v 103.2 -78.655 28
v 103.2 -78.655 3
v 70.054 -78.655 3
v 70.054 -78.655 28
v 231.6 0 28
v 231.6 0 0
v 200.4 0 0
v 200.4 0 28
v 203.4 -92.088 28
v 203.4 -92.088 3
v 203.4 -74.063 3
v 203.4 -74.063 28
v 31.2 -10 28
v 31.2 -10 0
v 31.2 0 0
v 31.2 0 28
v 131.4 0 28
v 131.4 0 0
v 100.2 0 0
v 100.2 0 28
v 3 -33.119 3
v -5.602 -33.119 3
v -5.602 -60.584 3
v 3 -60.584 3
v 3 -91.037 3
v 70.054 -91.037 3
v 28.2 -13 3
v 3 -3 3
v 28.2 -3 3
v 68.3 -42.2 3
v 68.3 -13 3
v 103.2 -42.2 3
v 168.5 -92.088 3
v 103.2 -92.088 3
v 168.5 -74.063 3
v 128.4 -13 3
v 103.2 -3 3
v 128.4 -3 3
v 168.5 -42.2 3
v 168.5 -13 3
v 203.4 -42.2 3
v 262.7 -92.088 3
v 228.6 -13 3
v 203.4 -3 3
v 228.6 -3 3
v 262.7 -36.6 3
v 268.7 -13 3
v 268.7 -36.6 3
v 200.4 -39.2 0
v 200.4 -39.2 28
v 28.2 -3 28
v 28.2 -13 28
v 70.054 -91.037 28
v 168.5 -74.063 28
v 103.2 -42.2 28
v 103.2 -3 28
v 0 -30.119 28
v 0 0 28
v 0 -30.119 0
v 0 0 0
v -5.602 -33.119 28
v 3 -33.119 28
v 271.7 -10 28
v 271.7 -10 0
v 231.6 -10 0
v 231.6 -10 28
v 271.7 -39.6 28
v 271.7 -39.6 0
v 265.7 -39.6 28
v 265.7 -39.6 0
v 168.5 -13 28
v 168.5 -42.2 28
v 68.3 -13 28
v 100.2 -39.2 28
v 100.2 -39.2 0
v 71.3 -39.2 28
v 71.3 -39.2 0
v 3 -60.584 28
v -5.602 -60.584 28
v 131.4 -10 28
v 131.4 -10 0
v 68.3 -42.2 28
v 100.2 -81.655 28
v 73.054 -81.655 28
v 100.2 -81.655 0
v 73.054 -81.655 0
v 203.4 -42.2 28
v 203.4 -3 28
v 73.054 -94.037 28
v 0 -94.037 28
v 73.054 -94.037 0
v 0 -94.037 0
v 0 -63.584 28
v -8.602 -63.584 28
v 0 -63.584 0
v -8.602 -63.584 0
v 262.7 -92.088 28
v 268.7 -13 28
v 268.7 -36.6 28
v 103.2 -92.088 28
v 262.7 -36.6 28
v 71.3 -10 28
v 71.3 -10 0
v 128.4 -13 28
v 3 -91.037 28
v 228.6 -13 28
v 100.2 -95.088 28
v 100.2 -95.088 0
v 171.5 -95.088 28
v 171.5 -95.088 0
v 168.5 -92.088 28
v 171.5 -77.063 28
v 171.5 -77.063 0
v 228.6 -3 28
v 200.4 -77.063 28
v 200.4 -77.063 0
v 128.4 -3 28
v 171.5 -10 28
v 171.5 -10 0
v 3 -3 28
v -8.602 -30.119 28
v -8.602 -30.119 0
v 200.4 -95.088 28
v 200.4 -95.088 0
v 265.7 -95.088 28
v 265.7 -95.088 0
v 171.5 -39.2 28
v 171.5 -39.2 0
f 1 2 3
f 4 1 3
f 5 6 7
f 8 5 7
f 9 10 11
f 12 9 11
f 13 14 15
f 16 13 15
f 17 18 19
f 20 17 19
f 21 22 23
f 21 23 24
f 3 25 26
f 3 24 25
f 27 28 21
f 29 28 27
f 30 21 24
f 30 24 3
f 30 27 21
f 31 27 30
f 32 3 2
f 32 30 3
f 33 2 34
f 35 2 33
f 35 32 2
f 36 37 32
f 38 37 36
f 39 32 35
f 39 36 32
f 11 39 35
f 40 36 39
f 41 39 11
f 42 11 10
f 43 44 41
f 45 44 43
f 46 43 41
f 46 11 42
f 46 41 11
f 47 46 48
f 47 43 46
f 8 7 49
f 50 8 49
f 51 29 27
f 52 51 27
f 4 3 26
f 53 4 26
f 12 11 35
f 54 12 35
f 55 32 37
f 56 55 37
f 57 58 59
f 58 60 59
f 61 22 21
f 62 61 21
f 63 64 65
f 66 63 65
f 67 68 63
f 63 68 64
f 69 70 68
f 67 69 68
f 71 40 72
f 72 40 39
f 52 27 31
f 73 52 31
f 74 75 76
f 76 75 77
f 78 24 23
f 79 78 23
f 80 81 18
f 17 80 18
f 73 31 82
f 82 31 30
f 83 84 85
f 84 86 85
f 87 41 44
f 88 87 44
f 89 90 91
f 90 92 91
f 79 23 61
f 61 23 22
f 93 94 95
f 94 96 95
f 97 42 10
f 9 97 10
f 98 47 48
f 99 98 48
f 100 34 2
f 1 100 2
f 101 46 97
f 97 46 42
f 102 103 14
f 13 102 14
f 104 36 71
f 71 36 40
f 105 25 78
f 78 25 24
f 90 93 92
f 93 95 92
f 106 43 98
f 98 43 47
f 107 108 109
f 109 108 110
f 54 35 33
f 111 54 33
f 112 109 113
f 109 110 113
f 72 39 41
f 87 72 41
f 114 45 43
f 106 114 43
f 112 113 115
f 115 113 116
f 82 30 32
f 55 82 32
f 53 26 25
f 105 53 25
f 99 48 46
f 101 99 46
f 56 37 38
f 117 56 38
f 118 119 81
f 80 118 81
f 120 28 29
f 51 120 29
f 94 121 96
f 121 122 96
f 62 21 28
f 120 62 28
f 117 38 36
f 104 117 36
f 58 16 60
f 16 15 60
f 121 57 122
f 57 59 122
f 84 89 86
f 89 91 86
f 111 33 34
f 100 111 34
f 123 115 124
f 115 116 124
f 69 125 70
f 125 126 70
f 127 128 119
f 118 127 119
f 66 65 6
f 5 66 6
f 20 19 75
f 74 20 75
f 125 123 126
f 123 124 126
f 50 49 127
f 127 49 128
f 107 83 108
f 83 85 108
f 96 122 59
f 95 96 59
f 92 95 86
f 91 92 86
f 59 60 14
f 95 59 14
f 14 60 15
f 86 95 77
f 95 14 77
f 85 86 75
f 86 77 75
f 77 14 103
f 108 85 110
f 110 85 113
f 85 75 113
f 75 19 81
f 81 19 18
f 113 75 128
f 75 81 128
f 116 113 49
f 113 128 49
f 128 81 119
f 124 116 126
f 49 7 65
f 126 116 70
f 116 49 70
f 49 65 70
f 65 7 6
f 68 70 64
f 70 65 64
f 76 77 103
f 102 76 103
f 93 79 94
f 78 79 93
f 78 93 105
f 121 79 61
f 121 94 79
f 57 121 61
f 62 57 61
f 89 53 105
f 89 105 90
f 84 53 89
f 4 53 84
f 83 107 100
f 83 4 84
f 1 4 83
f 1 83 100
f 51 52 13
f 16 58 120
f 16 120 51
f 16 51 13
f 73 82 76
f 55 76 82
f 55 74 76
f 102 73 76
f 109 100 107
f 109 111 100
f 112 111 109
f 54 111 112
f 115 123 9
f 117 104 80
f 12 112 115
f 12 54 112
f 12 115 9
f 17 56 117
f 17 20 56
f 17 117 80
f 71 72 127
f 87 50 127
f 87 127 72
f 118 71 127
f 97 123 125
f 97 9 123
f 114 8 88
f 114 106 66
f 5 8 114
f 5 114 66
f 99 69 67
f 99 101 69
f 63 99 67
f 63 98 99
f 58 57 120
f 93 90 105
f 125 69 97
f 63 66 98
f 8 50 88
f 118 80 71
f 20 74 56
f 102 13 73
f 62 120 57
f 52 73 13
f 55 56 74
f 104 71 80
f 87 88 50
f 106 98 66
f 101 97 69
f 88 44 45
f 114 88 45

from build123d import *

# Parameters (mm, degrees)
F1_DEPTH = 3
F3_DEPTH = 25


with BuildPart() as f1:
    # F0 (on Top) → F1 (new body)
    with BuildSketch(Plane.XY):
        Polygon((31.2, 0), (0, 0), (0, -30.118711), (-8.601577, -30.118711), (-8.601577, -63.583943), (0, -63.583943), (0, -94.037309), (73.053598, -94.037309), (73.053598, -81.655175), (100.2, -81.655175), (100.2, -95.087759), (171.5, -95.087759), (171.5, -77.062562), (200.4, -77.062562), (200.4, -95.087759), (265.7, -95.087759), (265.7, -39.6), (271.7, -39.6), (271.7, -10), (231.6, -10), (231.6, 0), (200.4, 0), (200.4, -39.2), (171.5, -39.2), (171.5, -10), (131.4, -10), (131.4, 0), (100.2, 0), (100.2, -39.2), (71.3, -39.2), (71.3, -10), (31.2, -10), align=None)
    extrude(amount=F1_DEPTH)

    # F2 (on face) → F3 (join)
    with BuildSketch(Plane.XY.offset(3)):
        Polygon((31.2, -10), (31.2, 0), (0, 0), (0, -30.118711), (-8.601577, -30.118711), (-8.601577, -63.583943), (0, -63.583943), (0, -94.037309), (73.053598, -94.037309), (73.053598, -81.655175), (100.2, -81.655175), (100.2, -95.087759), (171.5, -95.087759), (171.5, -77.062562), (200.4, -77.062562), (200.4, -95.087759), (265.7, -95.087759), (265.7, -39.6), (271.7, -39.6), (271.7, -10), (231.6, -10), (231.6, 0), (200.4, 0), (200.4, -39.2), (171.5, -39.2), (171.5, -10), (131.4, -10), (131.4, 0), (100.2, 0), (100.2, -39.2), (71.3, -39.2), (71.3, -10), align=None)
        Polygon((3, -91.037309), (3, -60.583943), (-5.601577, -60.583943), (-5.601577, -33.118711), (3, -33.118711), (3, -3), (28.2, -3), (28.2, -13), (68.3, -13), (68.3, -42.2), (103.2, -42.2), (103.2, -3), (128.4, -3), (128.4, -13), (168.5, -13), (168.5, -42.2), (203.4, -42.2), (203.4, -3), (228.6, -3), (228.6, -13), (268.7, -13), (268.7, -36.6), (262.7, -36.6), (262.7, -92.087759), (203.4, -92.087759), (203.4, -74.062562), (168.5, -74.062562), (168.5, -92.087759), (103.2, -92.087759), (103.2, -78.655175), (70.053598, -78.655175), (70.053598, -91.037309), align=None, mode=Mode.SUBTRACT)
    extrude(amount=F3_DEPTH)


solid = f1.part
